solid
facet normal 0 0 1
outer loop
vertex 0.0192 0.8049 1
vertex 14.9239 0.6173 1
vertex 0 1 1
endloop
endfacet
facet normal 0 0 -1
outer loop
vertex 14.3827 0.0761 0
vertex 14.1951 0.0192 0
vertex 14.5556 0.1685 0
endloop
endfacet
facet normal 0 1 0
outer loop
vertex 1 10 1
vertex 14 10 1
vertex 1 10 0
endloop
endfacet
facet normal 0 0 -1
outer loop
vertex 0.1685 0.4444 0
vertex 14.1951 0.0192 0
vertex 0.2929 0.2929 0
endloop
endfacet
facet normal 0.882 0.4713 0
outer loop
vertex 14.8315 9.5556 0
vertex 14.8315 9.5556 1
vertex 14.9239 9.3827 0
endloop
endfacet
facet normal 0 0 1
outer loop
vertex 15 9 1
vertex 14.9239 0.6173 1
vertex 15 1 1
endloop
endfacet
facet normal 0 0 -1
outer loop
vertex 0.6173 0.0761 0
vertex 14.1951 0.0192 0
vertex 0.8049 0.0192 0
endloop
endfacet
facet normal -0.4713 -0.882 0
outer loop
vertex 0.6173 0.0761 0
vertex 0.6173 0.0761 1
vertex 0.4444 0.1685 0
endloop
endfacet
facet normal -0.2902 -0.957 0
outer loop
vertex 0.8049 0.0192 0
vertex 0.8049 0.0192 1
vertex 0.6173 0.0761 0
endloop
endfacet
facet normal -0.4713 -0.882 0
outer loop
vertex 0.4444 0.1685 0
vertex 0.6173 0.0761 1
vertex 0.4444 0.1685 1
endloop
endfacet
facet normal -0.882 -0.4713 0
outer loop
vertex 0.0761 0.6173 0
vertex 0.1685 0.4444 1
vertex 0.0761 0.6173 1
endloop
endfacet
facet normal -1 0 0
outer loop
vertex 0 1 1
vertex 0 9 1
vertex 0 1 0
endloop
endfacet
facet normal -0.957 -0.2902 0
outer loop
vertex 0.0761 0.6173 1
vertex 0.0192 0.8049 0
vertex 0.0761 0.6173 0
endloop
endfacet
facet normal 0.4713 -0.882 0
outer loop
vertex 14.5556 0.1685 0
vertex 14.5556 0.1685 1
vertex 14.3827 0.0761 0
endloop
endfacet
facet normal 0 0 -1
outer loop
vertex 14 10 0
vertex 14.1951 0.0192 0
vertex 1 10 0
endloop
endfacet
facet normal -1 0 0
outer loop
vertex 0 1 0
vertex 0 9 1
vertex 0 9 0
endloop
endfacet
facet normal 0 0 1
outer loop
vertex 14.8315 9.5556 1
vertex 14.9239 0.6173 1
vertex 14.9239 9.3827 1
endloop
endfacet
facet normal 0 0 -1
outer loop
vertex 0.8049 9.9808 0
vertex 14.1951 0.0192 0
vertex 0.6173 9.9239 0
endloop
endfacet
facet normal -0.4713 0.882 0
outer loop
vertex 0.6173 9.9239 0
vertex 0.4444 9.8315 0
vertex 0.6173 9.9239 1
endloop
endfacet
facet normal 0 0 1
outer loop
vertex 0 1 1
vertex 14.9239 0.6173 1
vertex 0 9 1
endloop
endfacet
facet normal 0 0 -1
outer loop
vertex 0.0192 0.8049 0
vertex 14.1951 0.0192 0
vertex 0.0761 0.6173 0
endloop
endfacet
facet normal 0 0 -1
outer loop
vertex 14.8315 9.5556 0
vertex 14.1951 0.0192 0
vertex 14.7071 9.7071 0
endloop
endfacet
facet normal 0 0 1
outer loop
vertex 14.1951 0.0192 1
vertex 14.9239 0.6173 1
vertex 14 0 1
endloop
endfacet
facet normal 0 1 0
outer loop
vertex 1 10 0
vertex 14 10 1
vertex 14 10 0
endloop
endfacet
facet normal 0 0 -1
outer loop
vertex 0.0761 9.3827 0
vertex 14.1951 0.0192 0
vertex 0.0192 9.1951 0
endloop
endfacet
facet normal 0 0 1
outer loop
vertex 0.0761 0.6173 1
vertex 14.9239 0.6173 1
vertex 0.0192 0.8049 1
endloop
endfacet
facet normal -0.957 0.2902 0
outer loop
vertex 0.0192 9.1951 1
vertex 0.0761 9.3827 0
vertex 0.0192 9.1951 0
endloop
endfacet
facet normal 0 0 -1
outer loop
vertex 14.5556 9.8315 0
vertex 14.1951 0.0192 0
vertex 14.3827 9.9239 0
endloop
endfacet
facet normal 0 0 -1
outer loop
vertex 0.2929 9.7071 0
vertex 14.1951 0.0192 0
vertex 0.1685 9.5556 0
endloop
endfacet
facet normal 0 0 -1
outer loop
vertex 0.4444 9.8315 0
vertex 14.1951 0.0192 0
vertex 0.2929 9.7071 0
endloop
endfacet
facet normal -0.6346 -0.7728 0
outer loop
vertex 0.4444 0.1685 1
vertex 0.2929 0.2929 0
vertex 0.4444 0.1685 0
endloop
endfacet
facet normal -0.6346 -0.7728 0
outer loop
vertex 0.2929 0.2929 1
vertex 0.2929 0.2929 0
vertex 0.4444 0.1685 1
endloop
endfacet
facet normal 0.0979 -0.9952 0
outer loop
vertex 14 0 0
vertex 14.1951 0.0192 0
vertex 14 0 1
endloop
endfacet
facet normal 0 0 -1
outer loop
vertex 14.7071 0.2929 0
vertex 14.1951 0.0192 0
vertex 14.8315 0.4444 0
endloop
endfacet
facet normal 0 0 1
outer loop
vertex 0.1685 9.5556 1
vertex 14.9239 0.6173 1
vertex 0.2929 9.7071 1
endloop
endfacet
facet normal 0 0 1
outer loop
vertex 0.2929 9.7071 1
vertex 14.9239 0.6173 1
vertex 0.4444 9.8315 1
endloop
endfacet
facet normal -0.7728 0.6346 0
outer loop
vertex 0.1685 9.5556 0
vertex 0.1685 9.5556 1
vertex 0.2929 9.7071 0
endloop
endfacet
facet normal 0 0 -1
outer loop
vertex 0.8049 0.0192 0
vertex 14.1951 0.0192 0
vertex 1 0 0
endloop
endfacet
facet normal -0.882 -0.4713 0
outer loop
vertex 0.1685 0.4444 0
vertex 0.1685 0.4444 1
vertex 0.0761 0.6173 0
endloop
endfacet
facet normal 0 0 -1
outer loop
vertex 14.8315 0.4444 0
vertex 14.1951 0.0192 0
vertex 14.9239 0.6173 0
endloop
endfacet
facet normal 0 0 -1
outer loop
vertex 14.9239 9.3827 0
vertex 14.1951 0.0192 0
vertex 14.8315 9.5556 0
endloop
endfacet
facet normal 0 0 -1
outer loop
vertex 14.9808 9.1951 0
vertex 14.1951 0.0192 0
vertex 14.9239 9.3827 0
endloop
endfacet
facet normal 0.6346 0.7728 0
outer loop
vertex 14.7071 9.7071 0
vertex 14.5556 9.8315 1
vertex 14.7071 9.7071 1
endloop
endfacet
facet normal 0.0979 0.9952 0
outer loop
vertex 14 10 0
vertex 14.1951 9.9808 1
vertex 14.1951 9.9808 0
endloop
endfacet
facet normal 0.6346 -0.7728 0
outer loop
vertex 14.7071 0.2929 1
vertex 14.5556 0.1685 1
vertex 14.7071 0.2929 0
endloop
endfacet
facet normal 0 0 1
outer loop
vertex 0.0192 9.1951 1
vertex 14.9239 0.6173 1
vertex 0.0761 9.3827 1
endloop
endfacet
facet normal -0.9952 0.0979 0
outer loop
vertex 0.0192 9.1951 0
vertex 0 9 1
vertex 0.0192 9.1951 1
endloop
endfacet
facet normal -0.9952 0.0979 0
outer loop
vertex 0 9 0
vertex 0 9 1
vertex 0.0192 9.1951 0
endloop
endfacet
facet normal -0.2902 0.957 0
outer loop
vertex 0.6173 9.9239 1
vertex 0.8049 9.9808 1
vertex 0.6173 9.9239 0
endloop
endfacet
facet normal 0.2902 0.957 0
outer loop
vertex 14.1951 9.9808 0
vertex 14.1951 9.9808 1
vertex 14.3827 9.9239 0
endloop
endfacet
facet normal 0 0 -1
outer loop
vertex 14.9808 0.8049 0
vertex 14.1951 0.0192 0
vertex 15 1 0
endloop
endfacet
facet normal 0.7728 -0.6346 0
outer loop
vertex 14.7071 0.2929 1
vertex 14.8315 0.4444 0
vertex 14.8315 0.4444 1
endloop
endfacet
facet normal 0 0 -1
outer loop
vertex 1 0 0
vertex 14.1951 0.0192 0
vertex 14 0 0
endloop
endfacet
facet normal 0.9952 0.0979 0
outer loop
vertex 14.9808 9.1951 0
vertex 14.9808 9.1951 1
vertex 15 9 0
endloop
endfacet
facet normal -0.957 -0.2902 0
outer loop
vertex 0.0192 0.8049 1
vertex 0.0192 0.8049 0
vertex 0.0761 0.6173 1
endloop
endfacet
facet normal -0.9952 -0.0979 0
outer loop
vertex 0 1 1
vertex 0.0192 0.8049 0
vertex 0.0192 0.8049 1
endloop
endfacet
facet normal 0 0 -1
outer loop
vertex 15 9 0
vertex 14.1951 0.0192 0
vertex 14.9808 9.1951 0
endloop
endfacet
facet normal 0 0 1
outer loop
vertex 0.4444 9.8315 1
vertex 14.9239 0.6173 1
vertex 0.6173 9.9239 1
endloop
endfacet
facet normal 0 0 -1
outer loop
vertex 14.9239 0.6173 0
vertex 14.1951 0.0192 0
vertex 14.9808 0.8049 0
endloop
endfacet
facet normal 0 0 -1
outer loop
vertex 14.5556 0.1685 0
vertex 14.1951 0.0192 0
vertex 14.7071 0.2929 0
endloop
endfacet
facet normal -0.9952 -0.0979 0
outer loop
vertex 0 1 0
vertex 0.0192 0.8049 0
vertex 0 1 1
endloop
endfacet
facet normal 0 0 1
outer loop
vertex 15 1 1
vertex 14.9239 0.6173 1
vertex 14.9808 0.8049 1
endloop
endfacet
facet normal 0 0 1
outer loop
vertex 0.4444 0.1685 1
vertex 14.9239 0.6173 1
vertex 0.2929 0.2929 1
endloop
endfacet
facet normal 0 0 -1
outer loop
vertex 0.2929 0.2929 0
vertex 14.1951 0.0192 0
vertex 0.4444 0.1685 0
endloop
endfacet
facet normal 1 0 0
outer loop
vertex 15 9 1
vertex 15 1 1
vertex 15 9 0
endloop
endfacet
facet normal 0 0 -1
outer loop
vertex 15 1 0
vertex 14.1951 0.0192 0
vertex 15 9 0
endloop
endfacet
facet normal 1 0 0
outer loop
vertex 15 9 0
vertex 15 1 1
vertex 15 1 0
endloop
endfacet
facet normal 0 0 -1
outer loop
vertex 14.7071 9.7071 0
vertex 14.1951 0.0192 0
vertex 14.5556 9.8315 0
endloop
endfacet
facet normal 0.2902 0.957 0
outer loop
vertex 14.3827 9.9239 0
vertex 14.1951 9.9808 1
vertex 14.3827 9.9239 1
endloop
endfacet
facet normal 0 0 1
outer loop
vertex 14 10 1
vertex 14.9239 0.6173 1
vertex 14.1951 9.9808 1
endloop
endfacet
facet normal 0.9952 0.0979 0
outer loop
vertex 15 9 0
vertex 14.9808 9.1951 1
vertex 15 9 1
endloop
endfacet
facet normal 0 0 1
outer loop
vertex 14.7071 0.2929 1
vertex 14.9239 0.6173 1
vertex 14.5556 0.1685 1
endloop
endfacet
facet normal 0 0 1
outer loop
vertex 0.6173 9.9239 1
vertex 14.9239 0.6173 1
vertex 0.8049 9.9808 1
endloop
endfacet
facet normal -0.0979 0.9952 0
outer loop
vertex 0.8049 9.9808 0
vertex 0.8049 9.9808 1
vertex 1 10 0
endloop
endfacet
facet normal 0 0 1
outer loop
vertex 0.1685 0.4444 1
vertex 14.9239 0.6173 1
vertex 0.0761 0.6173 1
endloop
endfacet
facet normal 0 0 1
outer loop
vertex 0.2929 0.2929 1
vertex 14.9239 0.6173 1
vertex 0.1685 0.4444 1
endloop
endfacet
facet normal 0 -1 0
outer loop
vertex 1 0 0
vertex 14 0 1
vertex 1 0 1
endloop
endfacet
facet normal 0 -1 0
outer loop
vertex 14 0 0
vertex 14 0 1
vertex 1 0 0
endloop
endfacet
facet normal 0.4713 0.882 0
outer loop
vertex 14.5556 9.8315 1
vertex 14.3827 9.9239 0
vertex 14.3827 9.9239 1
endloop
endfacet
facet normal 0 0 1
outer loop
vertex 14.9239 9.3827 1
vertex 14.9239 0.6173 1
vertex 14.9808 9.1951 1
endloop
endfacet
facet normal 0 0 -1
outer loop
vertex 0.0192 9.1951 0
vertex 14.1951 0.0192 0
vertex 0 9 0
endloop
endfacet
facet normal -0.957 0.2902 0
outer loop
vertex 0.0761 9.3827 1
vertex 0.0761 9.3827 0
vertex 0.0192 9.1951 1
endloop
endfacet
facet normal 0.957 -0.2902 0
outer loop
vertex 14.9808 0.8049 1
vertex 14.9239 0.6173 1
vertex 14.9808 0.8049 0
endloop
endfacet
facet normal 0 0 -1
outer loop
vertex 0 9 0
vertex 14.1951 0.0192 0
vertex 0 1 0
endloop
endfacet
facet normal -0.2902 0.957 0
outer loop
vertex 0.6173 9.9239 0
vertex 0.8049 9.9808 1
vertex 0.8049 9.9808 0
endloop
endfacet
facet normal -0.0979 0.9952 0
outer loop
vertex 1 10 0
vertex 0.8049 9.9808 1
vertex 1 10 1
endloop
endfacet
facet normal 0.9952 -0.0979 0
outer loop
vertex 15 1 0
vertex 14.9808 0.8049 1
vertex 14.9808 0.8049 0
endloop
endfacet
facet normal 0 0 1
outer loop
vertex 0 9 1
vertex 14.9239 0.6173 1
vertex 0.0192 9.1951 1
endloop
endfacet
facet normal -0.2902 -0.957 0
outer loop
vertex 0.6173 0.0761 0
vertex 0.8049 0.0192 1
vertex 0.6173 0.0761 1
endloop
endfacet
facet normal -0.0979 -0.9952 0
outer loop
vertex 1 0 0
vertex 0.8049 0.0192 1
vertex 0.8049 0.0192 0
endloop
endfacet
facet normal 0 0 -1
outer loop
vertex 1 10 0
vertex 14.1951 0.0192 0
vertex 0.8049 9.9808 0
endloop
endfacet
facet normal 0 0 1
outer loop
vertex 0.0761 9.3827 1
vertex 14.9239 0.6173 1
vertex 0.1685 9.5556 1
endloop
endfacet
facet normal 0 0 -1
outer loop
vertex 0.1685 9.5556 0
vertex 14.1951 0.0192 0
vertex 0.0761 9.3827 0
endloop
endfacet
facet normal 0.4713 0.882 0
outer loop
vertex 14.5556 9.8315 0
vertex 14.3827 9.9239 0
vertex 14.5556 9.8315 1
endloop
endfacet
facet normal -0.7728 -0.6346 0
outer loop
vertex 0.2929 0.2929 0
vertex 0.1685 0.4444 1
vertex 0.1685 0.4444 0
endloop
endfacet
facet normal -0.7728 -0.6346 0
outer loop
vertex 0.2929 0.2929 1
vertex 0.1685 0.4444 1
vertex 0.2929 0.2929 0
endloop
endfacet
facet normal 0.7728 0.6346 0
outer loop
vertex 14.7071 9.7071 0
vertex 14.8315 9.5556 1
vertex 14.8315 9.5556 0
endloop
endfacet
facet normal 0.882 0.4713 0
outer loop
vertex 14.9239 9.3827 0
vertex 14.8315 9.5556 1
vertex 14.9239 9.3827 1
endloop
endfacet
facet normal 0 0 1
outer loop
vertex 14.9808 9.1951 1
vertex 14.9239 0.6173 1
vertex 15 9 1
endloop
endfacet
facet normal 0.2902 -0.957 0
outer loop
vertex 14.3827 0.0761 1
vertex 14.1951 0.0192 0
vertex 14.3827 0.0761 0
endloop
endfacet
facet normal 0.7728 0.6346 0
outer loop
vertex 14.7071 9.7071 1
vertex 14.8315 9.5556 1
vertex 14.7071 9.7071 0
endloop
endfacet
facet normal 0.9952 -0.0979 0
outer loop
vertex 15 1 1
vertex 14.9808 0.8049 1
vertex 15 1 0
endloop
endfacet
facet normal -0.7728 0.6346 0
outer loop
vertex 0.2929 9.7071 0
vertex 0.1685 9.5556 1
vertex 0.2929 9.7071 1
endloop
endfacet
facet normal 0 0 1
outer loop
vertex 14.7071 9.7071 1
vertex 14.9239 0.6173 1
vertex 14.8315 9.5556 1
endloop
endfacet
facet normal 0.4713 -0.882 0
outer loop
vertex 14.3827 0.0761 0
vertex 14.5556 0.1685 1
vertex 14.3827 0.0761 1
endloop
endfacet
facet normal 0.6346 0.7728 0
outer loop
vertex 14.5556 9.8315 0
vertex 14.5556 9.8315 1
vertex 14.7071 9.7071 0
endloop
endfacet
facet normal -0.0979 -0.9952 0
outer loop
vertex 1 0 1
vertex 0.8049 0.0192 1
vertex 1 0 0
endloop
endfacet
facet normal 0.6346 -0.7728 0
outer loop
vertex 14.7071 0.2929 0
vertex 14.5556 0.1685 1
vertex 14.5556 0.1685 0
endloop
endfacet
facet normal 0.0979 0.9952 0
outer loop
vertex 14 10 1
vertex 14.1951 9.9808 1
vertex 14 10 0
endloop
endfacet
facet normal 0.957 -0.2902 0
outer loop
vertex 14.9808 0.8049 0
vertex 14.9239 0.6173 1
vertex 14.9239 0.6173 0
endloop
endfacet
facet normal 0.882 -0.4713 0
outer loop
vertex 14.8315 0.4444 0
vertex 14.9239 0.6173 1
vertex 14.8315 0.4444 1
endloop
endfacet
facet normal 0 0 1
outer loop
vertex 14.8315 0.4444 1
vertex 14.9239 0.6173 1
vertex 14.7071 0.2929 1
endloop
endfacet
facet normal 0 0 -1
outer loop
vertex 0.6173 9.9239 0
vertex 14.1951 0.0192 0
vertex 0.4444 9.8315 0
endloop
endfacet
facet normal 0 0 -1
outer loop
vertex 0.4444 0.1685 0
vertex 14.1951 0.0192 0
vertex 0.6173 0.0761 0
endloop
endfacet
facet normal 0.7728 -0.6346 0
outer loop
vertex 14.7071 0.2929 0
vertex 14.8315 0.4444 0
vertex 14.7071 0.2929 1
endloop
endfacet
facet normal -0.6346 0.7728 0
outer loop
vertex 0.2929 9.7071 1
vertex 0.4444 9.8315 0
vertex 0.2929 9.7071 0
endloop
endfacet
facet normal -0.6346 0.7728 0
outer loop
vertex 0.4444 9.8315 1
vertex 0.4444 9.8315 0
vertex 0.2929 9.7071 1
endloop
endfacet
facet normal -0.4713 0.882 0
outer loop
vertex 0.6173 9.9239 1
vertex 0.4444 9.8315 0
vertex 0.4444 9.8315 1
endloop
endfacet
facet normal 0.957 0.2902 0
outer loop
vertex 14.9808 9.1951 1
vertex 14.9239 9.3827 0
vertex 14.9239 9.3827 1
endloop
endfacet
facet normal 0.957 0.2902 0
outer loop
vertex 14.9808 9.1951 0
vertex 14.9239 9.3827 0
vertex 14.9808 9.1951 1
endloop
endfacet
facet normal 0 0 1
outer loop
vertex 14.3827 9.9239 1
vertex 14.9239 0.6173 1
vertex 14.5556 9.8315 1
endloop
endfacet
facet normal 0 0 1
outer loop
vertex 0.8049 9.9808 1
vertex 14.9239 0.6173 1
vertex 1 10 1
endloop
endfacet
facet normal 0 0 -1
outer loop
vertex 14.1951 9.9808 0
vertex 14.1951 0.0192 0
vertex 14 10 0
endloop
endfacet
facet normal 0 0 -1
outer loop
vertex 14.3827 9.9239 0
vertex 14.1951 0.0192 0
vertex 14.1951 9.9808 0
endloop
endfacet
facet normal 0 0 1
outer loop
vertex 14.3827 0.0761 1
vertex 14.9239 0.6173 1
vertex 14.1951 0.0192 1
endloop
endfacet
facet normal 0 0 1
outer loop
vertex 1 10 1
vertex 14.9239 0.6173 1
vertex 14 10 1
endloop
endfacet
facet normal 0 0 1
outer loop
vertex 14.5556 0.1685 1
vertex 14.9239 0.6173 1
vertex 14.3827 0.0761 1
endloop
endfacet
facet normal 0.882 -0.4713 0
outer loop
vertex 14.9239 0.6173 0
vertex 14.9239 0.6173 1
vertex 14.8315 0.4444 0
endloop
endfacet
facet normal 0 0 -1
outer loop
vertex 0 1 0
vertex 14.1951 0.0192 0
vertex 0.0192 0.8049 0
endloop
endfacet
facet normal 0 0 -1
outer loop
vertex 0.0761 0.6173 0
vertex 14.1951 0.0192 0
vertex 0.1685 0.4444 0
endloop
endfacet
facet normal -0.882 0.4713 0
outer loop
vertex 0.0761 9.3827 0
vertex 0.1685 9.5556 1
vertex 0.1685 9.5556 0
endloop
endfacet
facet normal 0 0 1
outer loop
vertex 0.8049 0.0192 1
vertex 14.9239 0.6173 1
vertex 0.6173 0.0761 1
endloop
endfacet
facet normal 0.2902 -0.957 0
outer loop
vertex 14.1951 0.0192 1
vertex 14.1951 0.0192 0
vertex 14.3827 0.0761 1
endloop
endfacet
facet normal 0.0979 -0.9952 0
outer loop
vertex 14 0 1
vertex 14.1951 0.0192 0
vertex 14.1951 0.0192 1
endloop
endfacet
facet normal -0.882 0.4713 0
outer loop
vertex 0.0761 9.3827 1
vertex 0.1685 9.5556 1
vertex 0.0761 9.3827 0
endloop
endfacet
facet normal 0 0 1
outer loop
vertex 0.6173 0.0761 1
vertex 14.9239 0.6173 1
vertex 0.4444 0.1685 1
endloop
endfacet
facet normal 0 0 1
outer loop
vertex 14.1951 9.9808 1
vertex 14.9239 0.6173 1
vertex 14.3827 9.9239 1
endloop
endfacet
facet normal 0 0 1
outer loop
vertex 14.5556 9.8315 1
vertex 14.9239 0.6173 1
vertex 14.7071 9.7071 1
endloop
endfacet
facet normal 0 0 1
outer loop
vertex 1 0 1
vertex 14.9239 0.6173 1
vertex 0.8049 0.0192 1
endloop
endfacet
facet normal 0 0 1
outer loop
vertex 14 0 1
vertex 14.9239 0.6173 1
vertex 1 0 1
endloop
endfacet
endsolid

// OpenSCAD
//Rounded plate module - faster than minkowski!
//variables with "customizer" in them are only for the Thingiverse customizer and are not essential.


customizer_x=15;
customizer_y=10;
customizer_z=1;

customizer_facets=32;
customizer_rounding_radius=1;

module rounded_plate(size_x,size_y,size_z,facets,rounding_radius)
{
	hull()
	{
		translate([rounding_radius,rounding_radius,0]) cylinder (h=size_z, r=rounding_radius,$fn=facets);
		translate([size_x-rounding_radius,rounding_radius,0]) cylinder (h=size_z,r=rounding_radius,$fn=facets);
		translate([rounding_radius,size_y-rounding_radius,0]) cylinder (h=size_z,r=rounding_radius,$fn=facets);
		translate([size_x-rounding_radius,size_y-rounding_radius,0]) cylinder (h=size_z,r=rounding_radius,$fn=facets);
	}
}

rounded_plate(customizer_x,customizer_y,customizer_z,customizer_facets,customizer_rounding_radius);
